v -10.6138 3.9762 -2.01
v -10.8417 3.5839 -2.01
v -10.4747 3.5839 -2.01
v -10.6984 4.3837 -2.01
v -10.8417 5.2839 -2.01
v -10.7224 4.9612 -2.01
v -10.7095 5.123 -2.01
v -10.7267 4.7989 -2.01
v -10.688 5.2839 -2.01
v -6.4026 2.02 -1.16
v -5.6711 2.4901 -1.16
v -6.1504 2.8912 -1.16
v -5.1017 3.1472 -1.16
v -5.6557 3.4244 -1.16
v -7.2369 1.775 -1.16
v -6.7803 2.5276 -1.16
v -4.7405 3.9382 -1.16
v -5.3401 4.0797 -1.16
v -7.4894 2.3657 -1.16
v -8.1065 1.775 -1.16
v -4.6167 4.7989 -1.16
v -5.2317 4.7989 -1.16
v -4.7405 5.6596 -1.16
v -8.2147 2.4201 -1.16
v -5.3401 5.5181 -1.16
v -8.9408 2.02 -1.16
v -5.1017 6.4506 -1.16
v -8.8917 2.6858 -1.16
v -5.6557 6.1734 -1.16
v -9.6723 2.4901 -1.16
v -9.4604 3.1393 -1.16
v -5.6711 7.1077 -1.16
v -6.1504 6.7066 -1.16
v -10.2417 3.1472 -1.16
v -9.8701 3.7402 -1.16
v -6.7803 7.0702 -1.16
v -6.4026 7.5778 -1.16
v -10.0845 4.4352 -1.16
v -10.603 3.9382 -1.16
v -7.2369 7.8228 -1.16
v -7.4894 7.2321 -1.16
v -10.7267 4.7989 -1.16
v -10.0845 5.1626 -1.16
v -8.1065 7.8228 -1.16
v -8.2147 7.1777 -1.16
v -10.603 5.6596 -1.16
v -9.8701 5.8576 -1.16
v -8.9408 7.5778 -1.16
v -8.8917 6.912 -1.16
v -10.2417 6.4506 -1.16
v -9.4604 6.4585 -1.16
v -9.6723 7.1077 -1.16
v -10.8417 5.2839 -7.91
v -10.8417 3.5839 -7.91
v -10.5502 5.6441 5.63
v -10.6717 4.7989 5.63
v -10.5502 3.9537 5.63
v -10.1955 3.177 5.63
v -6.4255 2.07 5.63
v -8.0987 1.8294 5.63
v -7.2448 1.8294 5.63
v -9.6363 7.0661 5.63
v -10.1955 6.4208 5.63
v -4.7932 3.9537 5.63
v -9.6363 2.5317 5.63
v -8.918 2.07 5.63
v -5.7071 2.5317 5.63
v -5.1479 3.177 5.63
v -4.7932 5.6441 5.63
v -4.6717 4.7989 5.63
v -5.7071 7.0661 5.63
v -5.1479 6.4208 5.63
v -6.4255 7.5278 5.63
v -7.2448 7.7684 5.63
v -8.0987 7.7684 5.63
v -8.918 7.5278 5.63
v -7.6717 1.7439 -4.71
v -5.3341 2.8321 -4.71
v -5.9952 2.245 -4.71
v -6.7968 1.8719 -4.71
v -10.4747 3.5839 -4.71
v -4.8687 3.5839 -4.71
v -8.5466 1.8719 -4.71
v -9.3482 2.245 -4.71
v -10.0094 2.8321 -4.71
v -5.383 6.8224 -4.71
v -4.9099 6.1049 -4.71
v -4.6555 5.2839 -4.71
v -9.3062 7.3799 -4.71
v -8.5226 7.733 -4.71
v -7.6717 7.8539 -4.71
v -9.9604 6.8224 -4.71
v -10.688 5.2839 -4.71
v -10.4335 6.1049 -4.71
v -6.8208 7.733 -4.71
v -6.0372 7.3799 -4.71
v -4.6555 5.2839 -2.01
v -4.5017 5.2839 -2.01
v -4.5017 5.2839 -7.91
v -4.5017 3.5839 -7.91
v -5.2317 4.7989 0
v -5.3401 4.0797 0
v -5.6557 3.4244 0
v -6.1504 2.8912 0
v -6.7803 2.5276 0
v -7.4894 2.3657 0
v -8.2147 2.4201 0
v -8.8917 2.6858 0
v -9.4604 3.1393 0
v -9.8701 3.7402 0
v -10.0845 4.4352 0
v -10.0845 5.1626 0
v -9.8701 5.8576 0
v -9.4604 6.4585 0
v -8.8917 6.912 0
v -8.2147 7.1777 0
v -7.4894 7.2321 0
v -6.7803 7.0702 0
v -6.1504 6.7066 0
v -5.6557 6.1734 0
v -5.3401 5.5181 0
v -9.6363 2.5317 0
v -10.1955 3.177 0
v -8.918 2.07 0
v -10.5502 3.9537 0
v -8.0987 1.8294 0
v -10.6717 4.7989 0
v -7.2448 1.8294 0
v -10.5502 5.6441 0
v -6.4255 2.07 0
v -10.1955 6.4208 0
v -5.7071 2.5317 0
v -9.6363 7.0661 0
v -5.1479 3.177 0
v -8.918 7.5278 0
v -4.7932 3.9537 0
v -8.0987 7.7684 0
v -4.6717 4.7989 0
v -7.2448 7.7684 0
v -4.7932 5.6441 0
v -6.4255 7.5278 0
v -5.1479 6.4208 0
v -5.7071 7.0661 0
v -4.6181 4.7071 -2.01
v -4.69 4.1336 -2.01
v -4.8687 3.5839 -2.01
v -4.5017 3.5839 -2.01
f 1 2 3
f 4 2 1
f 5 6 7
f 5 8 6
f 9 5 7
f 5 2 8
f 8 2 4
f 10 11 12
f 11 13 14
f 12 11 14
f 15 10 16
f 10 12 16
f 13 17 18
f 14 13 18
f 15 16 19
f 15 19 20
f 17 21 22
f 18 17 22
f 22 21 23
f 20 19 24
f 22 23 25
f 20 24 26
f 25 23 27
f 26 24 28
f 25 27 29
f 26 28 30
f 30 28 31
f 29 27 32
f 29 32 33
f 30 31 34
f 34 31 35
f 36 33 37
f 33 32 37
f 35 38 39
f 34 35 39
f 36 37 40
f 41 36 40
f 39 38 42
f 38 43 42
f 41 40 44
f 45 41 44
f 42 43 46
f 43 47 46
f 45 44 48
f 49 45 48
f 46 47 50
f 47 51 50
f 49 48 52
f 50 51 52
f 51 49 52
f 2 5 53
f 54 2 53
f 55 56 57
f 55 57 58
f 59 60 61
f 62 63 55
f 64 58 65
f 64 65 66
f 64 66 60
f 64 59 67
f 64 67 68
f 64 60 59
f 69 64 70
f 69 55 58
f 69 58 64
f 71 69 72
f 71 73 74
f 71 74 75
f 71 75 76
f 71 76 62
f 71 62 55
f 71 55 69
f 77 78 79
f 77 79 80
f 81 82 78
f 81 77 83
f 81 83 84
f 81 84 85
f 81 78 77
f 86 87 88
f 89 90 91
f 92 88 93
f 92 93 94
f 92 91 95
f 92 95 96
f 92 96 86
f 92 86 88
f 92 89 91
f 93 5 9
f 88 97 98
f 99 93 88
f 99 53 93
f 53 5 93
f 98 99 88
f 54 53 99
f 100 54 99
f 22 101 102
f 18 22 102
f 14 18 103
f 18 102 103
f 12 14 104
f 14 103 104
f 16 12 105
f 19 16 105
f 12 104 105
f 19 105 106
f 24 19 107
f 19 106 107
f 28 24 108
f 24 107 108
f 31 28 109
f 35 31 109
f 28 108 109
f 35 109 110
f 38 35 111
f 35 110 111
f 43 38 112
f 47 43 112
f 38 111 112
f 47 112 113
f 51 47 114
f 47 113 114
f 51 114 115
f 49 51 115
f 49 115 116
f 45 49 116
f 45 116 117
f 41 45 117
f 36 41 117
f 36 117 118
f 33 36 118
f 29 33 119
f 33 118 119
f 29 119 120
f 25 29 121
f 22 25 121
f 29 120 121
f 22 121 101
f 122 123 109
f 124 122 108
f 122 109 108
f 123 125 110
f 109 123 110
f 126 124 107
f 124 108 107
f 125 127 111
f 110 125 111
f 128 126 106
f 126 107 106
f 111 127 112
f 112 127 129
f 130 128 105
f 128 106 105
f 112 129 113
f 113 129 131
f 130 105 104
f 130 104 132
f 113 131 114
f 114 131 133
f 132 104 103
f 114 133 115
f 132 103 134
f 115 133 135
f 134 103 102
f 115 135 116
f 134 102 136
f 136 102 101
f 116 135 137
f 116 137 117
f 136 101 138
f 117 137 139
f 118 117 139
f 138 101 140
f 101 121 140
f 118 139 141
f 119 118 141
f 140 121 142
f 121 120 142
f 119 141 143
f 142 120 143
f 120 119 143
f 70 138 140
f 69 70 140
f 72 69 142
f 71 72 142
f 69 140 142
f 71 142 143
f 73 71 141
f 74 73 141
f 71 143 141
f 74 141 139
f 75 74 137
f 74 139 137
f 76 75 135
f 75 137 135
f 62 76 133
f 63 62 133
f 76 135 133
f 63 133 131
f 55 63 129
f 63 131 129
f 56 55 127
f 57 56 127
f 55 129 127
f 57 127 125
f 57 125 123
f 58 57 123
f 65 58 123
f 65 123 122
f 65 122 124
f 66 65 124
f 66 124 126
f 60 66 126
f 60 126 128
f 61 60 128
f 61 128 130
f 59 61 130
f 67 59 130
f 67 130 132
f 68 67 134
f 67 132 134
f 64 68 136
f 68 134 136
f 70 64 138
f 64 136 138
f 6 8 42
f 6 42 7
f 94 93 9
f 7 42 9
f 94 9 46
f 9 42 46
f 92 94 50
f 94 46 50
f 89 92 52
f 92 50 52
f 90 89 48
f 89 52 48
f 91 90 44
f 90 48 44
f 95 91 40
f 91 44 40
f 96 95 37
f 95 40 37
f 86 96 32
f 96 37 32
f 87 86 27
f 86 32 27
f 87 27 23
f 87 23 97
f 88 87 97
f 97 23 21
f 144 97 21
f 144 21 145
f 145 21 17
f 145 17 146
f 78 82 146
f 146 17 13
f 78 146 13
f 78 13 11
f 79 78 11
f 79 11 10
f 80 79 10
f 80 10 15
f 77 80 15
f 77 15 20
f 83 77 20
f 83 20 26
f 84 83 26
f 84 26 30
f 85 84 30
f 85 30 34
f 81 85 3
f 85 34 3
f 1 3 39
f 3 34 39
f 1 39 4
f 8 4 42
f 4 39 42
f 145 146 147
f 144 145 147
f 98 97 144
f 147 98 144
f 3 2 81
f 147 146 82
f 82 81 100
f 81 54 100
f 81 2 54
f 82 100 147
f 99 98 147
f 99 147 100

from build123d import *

# Parameters (mm, degrees)
SKETCH3_R           = 3
BOSS_EXTRUDE1_DEPTH = 5.63
SKETCH8_R           = 2.44
BOSS_EXTRUDE2_DEPTH = 1.16
SKETCH9_R           = 3.055
BOSS_EXTRUDE3_DEPTH = 3.55
BOSS_EXTRUDE4_START = 0.485
SKETCH15_W          = 6.34
SKETCH15_H          = 5.9
BOSS_EXTRUDE4_DEPTH = 1.7


with BuildPart() as part:
    # Sketch3 → Boss-Extrude1 (new body)
    with BuildSketch(Plane.XY):
        with Locations((-7.67170946, 4.798899109)):
            Circle(SKETCH3_R)
    extrude(amount=BOSS_EXTRUDE1_DEPTH)

    # Sketch8 → Boss-Extrude2 (add)
    with BuildSketch(Plane(origin=(0, 0, 0), x_dir=(-1, 0, 0), z_dir=(0, 0, -1))):
        with Locations(Location((7.67170946, 4.798899109, 0), (0, 0, 180))):
            Circle(SKETCH8_R)
    extrude(amount=BOSS_EXTRUDE2_DEPTH)

    # Sketch9 → Boss-Extrude3 (add)
    with BuildSketch(Plane(origin=(0, 0, -1.16), x_dir=(-1, 0, 0), z_dir=(0, 0, -1))):
        with Locations((7.67170946, 4.798899109)):
            Circle(SKETCH9_R)
    extrude(amount=BOSS_EXTRUDE3_DEPTH)

    # Sketch15 → Boss-Extrude4 (add)
    with BuildSketch(Plane(origin=(0, 4.798899109, 0), x_dir=(1, 0, 0), z_dir=(0, 1, 0)).offset(BOSS_EXTRUDE4_START)):
        with Locations((-7.67170946, 4.96)):
            Rectangle(SKETCH15_W, SKETCH15_H)
    extrude(amount=-BOSS_EXTRUDE4_DEPTH)


solid = part.part
